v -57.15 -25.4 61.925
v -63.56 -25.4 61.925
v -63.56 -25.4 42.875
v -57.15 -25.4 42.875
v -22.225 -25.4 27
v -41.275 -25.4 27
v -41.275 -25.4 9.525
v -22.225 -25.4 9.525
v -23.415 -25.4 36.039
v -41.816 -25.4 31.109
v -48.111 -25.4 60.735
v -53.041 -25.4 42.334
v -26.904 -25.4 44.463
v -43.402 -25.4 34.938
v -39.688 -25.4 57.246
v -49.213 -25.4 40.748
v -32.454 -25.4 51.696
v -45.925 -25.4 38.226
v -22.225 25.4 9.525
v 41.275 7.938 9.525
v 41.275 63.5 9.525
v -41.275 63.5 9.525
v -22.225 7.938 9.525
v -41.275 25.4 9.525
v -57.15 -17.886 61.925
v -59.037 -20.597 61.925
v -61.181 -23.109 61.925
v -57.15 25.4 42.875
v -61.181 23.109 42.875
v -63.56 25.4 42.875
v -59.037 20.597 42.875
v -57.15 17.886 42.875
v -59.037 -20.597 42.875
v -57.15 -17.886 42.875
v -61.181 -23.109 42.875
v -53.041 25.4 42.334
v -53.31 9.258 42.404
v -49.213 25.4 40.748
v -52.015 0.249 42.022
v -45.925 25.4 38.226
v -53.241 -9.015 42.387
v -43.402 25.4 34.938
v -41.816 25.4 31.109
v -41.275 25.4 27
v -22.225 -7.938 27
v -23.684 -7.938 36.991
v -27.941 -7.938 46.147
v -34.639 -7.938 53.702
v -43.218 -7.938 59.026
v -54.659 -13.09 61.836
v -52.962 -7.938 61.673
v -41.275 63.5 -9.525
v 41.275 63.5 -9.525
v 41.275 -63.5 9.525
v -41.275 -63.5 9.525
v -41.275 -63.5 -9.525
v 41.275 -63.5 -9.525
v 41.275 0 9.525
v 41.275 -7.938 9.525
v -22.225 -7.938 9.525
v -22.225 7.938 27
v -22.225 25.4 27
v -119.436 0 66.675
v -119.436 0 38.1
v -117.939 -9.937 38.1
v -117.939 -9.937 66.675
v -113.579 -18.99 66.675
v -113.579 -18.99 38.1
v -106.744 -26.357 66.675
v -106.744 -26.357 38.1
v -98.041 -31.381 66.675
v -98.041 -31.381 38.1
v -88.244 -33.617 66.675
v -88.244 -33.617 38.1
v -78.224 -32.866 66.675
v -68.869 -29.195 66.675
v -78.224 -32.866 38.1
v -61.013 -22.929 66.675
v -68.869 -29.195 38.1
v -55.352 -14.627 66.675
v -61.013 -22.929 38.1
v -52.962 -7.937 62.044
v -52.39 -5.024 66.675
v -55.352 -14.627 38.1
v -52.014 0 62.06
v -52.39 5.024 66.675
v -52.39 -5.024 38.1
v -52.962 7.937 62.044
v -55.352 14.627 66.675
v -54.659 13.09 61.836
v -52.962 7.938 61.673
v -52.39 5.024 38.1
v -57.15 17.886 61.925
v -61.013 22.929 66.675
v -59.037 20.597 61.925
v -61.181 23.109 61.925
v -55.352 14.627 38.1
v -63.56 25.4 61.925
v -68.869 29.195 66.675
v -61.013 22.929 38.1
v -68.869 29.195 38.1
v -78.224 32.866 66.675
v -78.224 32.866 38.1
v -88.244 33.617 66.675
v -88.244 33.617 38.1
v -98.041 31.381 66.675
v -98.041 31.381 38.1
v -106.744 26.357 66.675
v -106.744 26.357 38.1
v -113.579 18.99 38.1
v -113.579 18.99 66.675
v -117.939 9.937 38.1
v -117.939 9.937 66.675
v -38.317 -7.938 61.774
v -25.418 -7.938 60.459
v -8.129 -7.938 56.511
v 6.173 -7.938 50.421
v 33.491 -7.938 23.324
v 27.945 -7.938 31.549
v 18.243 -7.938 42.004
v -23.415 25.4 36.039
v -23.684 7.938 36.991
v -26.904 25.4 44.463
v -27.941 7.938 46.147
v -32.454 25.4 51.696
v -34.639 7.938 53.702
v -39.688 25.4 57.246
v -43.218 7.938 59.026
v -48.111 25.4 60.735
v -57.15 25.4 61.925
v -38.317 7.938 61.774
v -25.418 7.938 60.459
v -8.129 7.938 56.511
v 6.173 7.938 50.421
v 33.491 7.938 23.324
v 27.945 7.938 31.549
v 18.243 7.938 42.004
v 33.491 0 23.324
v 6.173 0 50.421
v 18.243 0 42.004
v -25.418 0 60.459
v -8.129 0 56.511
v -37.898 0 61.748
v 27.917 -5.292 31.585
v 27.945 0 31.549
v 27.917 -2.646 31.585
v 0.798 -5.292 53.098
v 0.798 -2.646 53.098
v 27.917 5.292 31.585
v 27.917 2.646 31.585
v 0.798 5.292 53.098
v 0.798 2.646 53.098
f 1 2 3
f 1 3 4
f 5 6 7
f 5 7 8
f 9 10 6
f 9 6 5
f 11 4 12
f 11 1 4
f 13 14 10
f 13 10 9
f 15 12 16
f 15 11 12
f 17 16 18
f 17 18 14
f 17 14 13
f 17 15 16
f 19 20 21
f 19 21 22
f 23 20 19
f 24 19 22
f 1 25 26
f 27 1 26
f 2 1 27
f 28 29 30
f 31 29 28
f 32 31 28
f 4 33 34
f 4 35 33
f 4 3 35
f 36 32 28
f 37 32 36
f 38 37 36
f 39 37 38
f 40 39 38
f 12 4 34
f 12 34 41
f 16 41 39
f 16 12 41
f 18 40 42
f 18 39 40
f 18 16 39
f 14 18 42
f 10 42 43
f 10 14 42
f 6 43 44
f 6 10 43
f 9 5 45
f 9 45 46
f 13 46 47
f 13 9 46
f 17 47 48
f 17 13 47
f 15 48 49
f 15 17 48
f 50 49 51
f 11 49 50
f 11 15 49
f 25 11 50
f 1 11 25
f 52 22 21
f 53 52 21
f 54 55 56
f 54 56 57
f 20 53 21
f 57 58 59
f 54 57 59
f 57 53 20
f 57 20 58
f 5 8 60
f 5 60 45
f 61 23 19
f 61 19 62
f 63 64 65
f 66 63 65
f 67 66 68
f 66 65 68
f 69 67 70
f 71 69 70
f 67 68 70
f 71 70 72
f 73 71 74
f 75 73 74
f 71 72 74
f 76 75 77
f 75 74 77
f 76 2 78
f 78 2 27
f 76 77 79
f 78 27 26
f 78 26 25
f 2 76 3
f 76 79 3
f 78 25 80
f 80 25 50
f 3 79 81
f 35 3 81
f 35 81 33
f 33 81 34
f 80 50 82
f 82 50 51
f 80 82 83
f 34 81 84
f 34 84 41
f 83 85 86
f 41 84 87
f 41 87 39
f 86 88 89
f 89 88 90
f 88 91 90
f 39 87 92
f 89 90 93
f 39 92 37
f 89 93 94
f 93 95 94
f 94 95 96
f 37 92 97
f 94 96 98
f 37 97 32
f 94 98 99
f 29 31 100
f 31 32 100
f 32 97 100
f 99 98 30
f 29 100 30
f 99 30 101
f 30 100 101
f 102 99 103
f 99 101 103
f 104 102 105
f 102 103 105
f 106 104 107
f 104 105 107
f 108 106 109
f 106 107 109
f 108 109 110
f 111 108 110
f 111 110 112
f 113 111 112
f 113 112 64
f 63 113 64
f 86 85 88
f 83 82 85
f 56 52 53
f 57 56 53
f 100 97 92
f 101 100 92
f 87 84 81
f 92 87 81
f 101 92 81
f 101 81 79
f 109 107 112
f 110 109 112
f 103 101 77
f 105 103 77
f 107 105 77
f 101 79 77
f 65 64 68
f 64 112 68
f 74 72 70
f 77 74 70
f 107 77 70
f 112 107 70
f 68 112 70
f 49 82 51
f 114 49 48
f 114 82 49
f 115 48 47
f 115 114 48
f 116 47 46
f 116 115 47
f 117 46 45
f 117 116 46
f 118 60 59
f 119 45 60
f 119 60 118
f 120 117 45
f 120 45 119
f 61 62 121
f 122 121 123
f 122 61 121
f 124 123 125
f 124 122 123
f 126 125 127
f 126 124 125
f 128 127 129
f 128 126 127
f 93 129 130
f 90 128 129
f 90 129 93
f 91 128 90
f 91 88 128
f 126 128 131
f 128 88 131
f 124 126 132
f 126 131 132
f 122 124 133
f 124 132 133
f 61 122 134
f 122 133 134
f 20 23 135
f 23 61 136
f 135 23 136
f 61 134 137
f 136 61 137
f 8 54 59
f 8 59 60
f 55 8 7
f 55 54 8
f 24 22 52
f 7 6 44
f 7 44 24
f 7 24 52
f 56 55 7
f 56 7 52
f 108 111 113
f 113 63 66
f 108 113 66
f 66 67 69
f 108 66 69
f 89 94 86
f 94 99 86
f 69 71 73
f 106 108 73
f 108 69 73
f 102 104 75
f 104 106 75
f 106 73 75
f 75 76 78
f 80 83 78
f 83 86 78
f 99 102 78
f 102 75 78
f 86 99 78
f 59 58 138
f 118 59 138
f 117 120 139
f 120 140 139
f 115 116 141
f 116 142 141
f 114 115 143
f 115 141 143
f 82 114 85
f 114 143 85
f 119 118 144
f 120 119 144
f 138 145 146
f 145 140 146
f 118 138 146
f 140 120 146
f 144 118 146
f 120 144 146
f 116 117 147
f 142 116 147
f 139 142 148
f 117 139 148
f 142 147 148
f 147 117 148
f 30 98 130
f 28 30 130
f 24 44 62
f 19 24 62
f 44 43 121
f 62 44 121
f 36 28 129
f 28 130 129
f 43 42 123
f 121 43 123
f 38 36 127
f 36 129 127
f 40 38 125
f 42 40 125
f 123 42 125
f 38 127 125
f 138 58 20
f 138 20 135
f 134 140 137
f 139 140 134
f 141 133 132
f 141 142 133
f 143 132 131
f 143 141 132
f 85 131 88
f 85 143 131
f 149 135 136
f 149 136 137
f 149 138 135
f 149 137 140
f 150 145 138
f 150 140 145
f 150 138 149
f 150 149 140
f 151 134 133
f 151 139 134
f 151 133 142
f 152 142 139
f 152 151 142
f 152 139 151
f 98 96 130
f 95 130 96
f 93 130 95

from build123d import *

# Parameters (mm, degrees)
F1_DEPTH = 63.5
F0_W     = 17.08876
F0_H     = 4.7498
F2_DEPTH = 25.4
F3_DEPTH = 7.9375


with BuildPart() as f1:
    # F0 (on Front) → F1 (new body, symmetric)
    with BuildSketch(Plane.XZ):
        Polygon((-41.275, 9.525), (-41.275, -9.525), (41.275, -9.525), (41.275, 9.525), (-22.225, 9.525), align=None)
    extrude(amount=F1_DEPTH, both=True)

    # F0 (on Front) → F2 (join, symmetric)
    with BuildSketch(Plane.XZ):
        with Locations((-77.18062, 64.3001)):
            Rectangle(F0_W, F0_H)
        with BuildLine():
            Line((-41.275, 27.0002), (-41.275, 9.525))
            Line((-41.275, 9.525), (-22.225, 9.525))
            Line((-22.225, 9.525), (-22.225, 27.0002))
            ThreePointArc((-22.225, 27.0002), (-32.454296, 51.695904), (-57.15, 61.9252))
            Line((-57.15, 61.9252), (-68.63624, 61.9252))
            Line((-68.63624, 61.9252), (-68.63624, 42.8752))
            Line((-68.63624, 42.8752), (-57.15, 42.8752))
            ThreePointArc((-57.15, 42.8752), (-45.92468, 38.22552), (-41.275, 27.0002))
        make_face()
    extrude(amount=F2_DEPTH, both=True)

    # F0 (on Front) → F3 (join, symmetric)
    with BuildSketch(Plane.XZ):
        with BuildLine():
            Line((-22.225, 9.525), (41.275, 9.525))
            add(Edge.make_bspline(
                [(41.275, 9.525), (30.298301, 28.204535), (17.943603, 64.763766), (-57.15, 61.9252)],
                knots=[0, 0, 0, 0, 111.504536, 111.504536, 111.504536, 111.504536], degree=3))
            ThreePointArc((-57.15, 61.9252), (-32.454296, 51.695904), (-22.225, 27.0002))
            Line((-22.225, 27.0002), (-22.225, 9.525))
        make_face()
    extrude(amount=F3_DEPTH, both=True)

    # F0 (on Front) → F4 (revolve)
    with BuildSketch(Plane.XZ):
        Polygon((-85.725, 42.8752), (-85.725, 61.9252), (-85.725, 66.675), (-119.43624, 66.675), (-119.43624, 38.1), (-85.725, 38.1), align=None)
    revolve(axis=Axis((-85.725, 0, 52.3875), (0, 0, 1)))


solid = f1.part
